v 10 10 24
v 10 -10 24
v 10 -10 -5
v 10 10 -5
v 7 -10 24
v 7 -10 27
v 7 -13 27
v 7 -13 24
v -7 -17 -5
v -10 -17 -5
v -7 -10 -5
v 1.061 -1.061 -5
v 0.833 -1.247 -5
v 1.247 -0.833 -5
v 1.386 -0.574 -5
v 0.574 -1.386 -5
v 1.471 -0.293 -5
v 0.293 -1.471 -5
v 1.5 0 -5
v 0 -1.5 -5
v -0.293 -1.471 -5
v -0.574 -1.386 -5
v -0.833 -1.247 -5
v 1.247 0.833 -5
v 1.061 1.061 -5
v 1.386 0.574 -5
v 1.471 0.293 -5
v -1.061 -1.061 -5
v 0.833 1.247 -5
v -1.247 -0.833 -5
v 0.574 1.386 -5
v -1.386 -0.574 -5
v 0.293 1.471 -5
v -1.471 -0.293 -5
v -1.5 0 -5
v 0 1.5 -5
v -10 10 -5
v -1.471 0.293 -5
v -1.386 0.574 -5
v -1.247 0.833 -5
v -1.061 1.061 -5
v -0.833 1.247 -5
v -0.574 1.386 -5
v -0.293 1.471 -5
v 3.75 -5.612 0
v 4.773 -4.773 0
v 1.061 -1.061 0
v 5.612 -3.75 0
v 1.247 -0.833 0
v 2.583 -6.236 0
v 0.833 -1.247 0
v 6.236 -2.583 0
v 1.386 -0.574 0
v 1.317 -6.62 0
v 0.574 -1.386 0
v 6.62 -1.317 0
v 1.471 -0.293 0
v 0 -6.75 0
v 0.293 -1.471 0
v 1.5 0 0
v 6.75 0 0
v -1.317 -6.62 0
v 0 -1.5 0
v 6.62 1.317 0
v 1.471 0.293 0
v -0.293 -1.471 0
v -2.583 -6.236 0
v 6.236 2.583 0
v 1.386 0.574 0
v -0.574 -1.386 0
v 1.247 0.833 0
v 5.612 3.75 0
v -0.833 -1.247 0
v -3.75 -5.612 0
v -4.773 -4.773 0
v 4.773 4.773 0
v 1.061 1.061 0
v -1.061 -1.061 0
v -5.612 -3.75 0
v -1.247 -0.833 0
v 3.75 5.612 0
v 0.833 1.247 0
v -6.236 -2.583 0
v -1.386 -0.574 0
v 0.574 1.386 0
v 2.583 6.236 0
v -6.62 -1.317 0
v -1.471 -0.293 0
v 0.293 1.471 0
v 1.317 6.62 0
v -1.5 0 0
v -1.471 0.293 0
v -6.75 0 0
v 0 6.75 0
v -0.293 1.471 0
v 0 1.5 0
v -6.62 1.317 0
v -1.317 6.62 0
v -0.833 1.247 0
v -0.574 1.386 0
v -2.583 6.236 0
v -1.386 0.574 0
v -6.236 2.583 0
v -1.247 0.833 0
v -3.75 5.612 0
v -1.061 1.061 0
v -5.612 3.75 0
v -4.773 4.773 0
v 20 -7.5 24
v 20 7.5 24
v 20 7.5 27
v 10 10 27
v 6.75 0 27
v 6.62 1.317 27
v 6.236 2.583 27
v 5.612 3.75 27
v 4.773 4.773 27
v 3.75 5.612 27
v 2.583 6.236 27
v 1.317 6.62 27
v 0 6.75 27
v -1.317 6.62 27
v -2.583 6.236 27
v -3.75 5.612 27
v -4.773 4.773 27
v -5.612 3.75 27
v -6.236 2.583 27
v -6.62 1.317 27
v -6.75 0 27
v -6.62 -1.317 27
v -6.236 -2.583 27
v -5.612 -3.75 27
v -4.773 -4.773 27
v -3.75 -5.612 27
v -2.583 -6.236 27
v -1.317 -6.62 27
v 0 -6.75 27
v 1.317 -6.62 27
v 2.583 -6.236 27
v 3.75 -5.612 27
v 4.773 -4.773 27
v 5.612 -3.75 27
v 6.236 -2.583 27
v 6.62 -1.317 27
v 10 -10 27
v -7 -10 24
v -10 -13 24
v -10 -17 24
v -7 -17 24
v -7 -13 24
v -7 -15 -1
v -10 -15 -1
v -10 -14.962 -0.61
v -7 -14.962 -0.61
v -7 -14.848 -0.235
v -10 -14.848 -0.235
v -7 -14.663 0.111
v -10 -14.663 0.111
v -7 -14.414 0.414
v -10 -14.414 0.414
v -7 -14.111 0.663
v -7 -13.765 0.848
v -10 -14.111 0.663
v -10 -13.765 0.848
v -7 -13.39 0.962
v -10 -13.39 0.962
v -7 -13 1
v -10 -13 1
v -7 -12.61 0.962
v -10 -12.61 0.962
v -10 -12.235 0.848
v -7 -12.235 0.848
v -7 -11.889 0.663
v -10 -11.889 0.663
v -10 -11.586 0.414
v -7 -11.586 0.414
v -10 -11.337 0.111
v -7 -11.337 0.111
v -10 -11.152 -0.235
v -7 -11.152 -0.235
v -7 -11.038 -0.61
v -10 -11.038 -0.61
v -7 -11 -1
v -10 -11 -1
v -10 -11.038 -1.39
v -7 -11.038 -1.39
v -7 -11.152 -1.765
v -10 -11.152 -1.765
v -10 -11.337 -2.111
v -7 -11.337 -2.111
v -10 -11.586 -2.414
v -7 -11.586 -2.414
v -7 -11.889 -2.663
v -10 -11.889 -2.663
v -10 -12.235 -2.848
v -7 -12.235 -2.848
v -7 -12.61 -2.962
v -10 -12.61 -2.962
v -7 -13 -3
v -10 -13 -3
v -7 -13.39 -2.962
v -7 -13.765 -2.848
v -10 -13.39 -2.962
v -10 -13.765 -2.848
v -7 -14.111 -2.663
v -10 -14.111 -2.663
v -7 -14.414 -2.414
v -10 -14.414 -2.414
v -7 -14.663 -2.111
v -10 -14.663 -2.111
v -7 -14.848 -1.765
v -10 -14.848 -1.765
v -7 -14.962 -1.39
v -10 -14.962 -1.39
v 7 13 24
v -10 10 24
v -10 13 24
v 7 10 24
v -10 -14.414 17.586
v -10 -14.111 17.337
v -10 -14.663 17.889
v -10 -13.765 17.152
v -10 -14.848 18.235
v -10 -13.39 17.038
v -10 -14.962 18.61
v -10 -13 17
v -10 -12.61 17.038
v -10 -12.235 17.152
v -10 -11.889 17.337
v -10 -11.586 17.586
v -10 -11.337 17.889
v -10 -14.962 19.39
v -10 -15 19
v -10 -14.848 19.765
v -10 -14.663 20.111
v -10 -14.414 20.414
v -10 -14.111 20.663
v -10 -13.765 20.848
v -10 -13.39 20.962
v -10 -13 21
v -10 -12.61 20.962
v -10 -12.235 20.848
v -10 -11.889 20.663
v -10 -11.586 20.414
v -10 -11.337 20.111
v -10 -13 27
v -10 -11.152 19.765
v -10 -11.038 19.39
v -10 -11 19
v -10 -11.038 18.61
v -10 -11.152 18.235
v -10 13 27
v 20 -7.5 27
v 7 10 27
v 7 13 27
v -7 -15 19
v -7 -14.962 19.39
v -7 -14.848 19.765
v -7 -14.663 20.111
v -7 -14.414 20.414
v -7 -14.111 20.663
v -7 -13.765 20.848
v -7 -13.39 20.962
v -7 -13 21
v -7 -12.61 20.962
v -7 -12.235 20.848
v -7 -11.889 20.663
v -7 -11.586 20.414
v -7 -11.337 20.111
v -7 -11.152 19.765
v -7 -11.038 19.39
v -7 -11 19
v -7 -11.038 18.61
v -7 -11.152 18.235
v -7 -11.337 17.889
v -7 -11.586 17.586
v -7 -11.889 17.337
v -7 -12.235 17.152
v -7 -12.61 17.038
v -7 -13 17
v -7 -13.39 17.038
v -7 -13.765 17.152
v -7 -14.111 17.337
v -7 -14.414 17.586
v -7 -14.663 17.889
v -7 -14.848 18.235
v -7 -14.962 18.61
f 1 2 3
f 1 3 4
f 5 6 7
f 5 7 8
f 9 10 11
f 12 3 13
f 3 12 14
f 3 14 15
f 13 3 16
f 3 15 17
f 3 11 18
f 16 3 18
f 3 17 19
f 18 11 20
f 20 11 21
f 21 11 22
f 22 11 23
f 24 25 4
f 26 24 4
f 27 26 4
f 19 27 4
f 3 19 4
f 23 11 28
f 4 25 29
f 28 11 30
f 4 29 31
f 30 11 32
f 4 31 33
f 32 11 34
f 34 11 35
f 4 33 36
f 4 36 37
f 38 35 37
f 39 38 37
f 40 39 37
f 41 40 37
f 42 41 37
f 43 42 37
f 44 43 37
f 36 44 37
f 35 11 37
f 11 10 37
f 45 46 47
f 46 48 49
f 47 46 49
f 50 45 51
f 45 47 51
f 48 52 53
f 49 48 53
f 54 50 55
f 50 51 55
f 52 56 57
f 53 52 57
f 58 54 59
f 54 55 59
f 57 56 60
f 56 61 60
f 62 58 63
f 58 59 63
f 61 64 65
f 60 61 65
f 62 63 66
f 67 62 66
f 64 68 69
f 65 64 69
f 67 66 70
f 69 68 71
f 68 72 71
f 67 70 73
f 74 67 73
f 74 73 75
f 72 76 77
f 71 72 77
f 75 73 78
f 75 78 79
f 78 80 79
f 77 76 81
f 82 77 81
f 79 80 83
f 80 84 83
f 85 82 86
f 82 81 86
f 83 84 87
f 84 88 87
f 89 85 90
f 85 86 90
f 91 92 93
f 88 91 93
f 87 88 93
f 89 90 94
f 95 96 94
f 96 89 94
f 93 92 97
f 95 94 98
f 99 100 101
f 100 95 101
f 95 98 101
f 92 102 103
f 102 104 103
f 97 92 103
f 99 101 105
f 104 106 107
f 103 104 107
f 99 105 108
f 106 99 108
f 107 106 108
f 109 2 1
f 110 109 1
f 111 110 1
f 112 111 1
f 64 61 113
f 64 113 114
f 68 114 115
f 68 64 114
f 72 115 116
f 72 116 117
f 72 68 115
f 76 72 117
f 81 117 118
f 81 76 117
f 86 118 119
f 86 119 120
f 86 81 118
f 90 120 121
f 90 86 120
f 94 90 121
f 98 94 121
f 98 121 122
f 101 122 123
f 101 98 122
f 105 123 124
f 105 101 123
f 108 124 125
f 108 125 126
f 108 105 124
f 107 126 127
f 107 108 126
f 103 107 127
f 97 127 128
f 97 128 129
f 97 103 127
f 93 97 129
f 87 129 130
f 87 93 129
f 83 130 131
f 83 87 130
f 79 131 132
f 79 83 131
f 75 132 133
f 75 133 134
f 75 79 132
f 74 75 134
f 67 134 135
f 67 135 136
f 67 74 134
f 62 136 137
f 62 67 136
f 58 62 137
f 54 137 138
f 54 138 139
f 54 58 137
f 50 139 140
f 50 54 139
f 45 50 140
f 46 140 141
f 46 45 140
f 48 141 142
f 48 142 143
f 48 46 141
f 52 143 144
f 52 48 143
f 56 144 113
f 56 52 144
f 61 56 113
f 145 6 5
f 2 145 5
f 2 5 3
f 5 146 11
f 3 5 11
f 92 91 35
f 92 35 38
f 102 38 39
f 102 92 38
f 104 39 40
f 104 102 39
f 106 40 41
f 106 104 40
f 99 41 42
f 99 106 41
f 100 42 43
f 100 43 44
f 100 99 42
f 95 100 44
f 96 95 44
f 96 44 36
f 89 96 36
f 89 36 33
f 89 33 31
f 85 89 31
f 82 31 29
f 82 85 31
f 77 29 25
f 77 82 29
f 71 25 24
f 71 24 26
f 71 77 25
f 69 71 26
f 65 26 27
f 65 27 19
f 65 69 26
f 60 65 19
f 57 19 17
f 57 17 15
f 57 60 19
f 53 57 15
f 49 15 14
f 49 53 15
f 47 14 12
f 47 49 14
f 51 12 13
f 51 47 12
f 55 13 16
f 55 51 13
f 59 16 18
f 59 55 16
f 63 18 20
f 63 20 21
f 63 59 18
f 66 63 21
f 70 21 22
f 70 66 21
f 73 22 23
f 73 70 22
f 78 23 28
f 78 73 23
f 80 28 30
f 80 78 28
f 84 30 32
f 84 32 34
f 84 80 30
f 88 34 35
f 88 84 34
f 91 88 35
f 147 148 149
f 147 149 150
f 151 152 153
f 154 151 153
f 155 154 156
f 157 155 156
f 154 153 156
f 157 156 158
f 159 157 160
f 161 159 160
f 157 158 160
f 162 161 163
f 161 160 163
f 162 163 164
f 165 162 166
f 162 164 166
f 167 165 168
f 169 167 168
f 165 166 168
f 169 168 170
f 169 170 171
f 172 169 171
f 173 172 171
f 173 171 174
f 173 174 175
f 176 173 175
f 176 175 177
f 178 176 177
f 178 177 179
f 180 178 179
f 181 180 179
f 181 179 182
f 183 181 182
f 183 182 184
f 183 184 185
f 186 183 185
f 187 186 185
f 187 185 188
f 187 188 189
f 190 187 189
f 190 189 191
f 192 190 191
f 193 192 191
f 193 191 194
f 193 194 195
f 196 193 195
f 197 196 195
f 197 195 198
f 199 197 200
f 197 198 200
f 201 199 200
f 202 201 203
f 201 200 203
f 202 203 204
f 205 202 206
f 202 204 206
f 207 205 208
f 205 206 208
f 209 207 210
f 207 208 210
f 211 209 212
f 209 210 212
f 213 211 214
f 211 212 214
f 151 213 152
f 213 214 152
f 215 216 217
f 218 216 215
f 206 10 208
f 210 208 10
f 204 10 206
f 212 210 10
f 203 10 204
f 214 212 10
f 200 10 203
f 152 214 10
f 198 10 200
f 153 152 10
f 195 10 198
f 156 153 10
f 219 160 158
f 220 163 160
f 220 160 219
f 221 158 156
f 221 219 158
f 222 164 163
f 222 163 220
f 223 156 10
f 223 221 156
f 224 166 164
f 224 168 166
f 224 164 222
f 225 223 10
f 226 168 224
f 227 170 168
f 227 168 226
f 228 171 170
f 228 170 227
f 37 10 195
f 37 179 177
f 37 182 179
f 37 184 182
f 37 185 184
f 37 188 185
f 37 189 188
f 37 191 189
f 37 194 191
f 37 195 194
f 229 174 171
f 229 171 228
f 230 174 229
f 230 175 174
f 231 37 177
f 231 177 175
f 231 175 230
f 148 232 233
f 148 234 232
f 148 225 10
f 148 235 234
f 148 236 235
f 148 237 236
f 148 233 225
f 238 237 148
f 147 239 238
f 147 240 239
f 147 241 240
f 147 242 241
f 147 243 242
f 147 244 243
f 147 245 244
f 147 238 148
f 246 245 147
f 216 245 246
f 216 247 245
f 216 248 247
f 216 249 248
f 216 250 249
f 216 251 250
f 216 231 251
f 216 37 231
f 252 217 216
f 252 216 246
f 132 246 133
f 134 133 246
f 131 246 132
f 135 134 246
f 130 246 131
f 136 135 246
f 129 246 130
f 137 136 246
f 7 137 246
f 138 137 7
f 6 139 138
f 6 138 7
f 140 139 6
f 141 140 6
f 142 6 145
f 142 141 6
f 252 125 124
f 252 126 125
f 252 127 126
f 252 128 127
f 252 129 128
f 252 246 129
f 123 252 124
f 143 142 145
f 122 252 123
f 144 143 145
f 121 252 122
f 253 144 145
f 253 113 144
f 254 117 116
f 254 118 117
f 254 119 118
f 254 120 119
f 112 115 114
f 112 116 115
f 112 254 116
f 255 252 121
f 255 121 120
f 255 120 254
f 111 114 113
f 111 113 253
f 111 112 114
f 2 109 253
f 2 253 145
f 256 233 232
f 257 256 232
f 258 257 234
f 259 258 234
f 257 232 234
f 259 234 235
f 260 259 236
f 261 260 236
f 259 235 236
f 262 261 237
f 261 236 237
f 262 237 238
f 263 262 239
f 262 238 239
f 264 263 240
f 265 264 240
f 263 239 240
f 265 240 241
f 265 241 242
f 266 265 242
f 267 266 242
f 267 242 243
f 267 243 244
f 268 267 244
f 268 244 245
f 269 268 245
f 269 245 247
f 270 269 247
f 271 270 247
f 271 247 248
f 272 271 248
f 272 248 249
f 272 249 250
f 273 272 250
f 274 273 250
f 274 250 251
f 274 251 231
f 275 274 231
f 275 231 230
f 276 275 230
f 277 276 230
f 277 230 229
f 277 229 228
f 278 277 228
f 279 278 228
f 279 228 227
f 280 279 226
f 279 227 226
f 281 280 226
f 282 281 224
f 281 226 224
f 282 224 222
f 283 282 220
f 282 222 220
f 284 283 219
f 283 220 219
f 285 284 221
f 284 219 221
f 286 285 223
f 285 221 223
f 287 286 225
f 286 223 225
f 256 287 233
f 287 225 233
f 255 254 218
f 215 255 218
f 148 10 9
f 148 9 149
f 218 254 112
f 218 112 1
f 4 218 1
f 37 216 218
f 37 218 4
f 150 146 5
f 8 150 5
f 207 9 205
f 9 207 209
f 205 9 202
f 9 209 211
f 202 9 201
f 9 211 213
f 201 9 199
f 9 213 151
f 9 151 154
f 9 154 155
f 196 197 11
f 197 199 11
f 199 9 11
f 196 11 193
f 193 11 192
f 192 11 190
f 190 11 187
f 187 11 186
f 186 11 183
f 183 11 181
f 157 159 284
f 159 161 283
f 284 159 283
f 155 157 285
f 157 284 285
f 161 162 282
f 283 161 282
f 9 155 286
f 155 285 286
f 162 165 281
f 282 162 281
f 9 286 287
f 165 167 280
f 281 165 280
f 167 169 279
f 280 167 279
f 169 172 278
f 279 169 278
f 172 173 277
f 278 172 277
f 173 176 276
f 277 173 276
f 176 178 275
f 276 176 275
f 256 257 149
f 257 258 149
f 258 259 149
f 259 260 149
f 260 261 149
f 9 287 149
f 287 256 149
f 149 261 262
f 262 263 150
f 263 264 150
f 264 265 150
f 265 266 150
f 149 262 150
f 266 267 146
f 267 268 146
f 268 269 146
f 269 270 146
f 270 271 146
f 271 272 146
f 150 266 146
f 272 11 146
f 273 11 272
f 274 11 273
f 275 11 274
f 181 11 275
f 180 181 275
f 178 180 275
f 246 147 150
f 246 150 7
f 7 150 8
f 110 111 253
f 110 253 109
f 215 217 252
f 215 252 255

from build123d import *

# Parameters (mm, degrees)
SKETCH_1_W          = 20
SKETCH_1_H          = 20
SKETCH_1_R          = 6.75
EXTRUDE_1_DEPTH     = 27
SKETCH_2_W          = 20
SKETCH_2_H          = 20
SKETCH_2_R          = 1.5
EXTRUDE_2_DEPTH     = 5
SKETCH_3_W          = 3
SKETCH_3_H          = 20
EXTRUDE_3_DEPTH     = 10
CUT_EXTRUDE_1_DEPTH = 10
SKETCH_5_W          = 17
SKETCH_5_H          = 3
EXTRUDE_4_DEPTH     = 3
SKETCH_7_W          = 29
SKETCH_7_H          = 7
EXTRUDE_5_DEPTH     = 3
SKETCH_8_R          = 2
CUT_EXTRUDE_2_DEPTH = 10


with BuildPart() as part:
    # 草图1 → 凸台-拉伸1 (new body)
    with BuildSketch(Plane.XY):
        Rectangle(SKETCH_1_W, SKETCH_1_H)
        Circle(SKETCH_1_R, mode=Mode.SUBTRACT)
    extrude(amount=EXTRUDE_1_DEPTH)

    # 草图2 → 凸台-拉伸2 (add)
    with BuildSketch(Plane(origin=(0, 0, 0), x_dir=(-1, 0, 0), z_dir=(0, 0, -1))):
        Rectangle(SKETCH_2_W, SKETCH_2_H)
        Circle(SKETCH_2_R, mode=Mode.SUBTRACT)
    extrude(amount=EXTRUDE_2_DEPTH)

    # 草图3 → 凸台-拉伸3 (add)
    with BuildSketch(Plane(origin=(10, 0, 0), x_dir=(0, 0, -1), z_dir=(1, 0, 0))):
        with Locations((-25.5, 0)):
            Rectangle(SKETCH_3_W, SKETCH_3_H)
    extrude(amount=EXTRUDE_3_DEPTH)

    # 草图4 → 切除-拉伸1 (cut)
    with BuildSketch(Plane(origin=(0, 0, 24), x_dir=(-1, 0, 0), z_dir=(0, 0, -1))):
        Polygon((-20, 7.5), (-10, 10), (-20, 10), align=None)
    cut_extrude_1 = extrude(amount=-CUT_EXTRUDE_1_DEPTH, mode=Mode.SUBTRACT)

    # 镜向1: 切除-拉伸1 across plane
    add(cut_extrude_1.mirror(Plane.ZX), mode=Mode.SUBTRACT)

    # 草图5 → 凸台-拉伸4 (add)
    with BuildSketch(Plane(origin=(0, 10, 0), x_dir=(1, 0, 0), z_dir=(0, 1, 0))):
        with Locations((-1.5, -25.5)):
            Rectangle(SKETCH_5_W, SKETCH_5_H)
    extrude_4 = extrude(amount=EXTRUDE_4_DEPTH)

    # 镜向2: 凸台-拉伸4 across plane
    add(extrude_4.mirror(Plane.ZX))

    # 草图7 → 凸台-拉伸5 (add)
    with BuildSketch(Plane.ZY.offset(10)):
        with Locations((9.5, -13.5)):
            Rectangle(SKETCH_7_W, SKETCH_7_H)
    extrude(amount=-EXTRUDE_5_DEPTH)

    # 草图8 → 切除-拉伸2 (cut)
    with BuildSketch(Plane.ZY.offset(10)):
        with Locations(Location((19, -13, 0), (0, 0, 270))):
            Circle(SKETCH_8_R)
        with Locations(Location((-1, -13, 0), (0, 0, 270))):
            Circle(SKETCH_8_R)
    extrude(amount=-CUT_EXTRUDE_2_DEPTH, mode=Mode.SUBTRACT)


solid = part.part
